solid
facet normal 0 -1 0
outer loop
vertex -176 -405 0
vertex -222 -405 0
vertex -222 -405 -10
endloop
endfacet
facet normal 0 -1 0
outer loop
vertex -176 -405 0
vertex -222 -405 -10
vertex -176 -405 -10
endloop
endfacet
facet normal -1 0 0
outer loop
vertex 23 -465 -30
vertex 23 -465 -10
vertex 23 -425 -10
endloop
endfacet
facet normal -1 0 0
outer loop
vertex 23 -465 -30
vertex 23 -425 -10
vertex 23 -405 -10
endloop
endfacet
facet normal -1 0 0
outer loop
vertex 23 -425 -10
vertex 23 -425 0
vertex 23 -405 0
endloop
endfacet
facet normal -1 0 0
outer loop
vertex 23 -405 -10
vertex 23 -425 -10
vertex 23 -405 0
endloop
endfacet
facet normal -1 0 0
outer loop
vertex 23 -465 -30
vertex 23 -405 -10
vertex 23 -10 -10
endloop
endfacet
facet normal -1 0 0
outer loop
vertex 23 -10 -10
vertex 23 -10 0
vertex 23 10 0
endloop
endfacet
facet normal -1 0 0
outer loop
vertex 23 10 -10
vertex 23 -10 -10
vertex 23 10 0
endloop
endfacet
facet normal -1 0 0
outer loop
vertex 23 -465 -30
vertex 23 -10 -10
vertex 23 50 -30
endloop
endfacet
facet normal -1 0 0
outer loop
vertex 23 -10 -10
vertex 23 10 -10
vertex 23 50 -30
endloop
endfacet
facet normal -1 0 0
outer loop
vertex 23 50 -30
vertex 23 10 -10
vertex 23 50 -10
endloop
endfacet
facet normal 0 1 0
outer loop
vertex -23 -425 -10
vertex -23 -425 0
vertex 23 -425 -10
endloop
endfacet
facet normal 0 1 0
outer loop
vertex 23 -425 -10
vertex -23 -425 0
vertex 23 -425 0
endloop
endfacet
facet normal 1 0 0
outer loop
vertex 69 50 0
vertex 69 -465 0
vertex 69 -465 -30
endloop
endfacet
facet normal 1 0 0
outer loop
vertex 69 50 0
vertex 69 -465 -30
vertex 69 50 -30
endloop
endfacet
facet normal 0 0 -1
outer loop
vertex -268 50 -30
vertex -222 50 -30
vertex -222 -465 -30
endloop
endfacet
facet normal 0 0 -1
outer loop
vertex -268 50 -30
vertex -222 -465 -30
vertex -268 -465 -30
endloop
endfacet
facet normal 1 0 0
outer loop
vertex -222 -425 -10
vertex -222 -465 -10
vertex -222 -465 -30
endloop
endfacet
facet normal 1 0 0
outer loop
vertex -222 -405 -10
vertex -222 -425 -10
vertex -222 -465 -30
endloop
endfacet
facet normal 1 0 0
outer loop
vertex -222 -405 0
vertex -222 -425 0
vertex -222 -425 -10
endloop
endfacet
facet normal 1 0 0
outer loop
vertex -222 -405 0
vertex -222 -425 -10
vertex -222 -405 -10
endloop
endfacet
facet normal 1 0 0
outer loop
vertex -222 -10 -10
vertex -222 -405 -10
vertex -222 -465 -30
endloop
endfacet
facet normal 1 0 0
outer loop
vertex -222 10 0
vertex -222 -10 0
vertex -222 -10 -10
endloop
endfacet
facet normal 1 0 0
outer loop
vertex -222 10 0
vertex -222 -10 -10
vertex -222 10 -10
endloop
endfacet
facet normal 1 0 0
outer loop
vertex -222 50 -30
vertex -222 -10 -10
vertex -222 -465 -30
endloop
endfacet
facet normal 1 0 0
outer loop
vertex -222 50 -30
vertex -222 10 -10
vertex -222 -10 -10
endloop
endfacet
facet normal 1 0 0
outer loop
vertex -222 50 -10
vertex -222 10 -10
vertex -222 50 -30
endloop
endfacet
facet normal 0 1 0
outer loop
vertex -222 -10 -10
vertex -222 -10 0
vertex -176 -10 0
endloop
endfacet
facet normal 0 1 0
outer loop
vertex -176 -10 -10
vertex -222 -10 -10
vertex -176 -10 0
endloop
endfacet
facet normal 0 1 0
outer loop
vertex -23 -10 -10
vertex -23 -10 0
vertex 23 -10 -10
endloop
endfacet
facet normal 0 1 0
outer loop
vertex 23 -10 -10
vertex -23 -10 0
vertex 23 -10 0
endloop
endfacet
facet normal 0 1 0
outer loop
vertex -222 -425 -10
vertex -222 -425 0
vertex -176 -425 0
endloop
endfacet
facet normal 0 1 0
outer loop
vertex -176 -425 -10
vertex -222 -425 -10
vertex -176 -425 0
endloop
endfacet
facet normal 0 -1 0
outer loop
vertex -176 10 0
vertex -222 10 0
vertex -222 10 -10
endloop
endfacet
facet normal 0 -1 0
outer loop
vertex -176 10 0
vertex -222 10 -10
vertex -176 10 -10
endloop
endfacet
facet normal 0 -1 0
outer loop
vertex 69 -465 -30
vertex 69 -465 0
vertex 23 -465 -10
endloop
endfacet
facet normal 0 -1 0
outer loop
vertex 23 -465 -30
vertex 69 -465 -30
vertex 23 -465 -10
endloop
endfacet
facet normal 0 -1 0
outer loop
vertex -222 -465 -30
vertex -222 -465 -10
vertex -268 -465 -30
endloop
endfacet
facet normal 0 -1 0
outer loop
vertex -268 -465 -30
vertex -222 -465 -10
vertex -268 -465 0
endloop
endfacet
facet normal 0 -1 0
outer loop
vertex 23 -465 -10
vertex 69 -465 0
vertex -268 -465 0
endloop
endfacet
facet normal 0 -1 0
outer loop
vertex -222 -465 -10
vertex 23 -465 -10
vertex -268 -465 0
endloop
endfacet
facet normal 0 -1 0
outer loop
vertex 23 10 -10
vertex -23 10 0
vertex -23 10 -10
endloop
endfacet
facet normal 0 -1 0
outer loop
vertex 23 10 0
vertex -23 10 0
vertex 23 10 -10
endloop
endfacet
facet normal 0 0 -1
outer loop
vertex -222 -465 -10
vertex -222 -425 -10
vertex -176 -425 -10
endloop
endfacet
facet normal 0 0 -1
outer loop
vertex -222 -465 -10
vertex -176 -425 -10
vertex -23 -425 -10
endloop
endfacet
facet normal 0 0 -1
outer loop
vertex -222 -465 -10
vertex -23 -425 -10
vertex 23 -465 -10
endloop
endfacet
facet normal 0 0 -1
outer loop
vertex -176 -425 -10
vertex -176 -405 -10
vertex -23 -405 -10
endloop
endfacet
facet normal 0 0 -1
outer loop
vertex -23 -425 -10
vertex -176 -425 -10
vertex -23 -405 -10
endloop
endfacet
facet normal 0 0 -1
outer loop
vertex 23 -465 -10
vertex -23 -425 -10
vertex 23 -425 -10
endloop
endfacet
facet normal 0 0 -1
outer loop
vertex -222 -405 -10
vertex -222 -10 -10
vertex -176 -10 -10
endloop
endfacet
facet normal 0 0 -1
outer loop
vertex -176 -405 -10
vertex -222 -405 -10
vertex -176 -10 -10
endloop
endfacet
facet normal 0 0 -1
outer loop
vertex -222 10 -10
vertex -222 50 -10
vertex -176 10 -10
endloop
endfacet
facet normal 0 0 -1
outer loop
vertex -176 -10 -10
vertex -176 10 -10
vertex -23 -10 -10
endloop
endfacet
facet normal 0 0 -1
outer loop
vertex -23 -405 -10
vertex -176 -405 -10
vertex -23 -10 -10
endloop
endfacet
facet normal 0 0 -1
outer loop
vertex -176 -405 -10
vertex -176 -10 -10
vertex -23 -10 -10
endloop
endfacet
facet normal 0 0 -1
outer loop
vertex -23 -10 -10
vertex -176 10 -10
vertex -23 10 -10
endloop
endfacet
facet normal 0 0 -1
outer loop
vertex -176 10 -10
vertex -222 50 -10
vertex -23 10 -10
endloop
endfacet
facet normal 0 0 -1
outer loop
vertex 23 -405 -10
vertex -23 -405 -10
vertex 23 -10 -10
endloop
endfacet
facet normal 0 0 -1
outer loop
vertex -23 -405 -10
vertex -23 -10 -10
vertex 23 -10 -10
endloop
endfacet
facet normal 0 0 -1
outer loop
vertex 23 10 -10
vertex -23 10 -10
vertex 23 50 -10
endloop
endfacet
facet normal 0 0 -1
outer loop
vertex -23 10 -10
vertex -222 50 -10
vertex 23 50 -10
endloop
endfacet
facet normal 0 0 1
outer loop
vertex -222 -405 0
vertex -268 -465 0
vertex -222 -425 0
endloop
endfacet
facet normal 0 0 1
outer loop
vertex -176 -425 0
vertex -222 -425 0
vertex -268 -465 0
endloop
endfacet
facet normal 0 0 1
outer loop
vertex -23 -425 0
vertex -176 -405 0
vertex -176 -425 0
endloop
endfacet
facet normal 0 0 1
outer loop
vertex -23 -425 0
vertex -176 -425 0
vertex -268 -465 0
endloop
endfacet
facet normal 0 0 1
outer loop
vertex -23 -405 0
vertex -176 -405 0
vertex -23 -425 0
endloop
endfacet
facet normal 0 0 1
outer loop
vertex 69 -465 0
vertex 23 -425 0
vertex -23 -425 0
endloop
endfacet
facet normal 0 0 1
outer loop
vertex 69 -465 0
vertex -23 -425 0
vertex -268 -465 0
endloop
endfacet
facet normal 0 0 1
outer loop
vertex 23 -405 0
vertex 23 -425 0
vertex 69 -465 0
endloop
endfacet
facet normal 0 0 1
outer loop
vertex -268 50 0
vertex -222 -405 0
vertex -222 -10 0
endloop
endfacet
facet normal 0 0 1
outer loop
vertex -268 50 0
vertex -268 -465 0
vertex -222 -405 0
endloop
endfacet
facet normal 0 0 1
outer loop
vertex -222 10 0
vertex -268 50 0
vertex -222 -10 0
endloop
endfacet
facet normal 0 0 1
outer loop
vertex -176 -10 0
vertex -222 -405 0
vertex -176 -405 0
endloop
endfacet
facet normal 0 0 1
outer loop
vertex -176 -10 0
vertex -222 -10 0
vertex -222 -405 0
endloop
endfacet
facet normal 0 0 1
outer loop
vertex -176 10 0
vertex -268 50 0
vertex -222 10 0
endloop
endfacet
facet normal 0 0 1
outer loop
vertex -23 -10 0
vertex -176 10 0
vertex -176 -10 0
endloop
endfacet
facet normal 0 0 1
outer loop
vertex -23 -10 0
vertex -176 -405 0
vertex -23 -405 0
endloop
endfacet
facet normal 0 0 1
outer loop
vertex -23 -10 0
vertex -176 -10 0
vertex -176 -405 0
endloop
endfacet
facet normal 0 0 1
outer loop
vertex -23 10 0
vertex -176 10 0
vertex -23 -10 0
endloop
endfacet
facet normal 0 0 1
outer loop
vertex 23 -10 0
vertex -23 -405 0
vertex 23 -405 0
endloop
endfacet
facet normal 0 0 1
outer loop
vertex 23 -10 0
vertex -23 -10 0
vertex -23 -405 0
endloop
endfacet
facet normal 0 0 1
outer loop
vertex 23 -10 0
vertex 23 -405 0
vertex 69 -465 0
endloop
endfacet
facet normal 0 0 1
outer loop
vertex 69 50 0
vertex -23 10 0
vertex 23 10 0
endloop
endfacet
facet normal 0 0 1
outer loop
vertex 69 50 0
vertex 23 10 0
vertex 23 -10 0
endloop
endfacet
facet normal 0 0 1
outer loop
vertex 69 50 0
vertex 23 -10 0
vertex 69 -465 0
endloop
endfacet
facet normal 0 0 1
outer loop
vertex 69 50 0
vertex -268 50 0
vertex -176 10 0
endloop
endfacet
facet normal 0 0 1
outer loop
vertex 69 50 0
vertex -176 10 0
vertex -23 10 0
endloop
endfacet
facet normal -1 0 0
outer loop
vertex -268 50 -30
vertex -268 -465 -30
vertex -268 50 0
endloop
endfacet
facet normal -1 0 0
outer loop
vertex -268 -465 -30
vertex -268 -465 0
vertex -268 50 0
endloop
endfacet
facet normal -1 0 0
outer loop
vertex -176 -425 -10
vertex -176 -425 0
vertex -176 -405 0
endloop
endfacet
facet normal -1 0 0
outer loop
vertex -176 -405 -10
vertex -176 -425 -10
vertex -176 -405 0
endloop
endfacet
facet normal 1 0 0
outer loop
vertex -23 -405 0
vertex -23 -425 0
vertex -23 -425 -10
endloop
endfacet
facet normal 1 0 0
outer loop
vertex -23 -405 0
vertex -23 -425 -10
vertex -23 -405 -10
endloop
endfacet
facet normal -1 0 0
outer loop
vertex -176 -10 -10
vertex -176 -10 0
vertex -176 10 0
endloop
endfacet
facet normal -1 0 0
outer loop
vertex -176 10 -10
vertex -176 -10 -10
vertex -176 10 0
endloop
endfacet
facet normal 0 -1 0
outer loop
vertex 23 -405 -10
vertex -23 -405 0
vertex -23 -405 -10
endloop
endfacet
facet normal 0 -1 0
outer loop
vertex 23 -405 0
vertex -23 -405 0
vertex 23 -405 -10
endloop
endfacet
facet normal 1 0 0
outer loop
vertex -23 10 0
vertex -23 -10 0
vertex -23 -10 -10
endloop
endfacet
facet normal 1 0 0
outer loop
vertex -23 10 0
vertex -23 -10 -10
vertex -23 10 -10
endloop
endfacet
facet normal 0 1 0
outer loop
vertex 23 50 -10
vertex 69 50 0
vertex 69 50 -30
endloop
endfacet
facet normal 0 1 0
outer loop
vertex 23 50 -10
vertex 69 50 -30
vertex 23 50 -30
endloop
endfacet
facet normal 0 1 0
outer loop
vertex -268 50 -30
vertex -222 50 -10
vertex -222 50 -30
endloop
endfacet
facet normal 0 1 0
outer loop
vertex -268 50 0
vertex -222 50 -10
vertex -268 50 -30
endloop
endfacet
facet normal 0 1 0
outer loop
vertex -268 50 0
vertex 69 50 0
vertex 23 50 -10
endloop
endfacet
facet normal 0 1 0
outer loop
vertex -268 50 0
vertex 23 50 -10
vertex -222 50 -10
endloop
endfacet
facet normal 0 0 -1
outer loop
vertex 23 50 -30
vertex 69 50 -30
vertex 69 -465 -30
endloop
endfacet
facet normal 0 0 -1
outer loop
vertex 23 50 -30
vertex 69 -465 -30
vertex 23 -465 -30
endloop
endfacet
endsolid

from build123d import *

# Parameters (mm, degrees)
SKETCH1_W           = 337
SKETCH1_H           = 515
SKETCH1_W_2         = 46
SKETCH1_H_2         = 20
BOSS_EXTRUDE1_DEPTH = 10
SKETCH2_W           = 46
SKETCH2_H           = 515
BOSS_EXTRUDE2_DEPTH = 20


with BuildPart() as part:
    # Sketch1 → Boss-Extrude1 (new body)
    with BuildSketch(Plane.XY):
        with Locations((-99.5, -207.5)):
            Rectangle(SKETCH1_W, SKETCH1_H)
        with Locations((-199, -415)):
            Rectangle(SKETCH1_W_2, SKETCH1_H_2, mode=Mode.SUBTRACT)
        with Locations((0, -415)):
            Rectangle(SKETCH1_W_2, SKETCH1_H_2, mode=Mode.SUBTRACT)
        with Locations((-199, 0)):
            Rectangle(SKETCH1_W_2, SKETCH1_H_2, mode=Mode.SUBTRACT)
        Rectangle(SKETCH1_W_2, SKETCH1_H_2, mode=Mode.SUBTRACT)
    extrude(amount=-BOSS_EXTRUDE1_DEPTH)

    # Sketch2 → Boss-Extrude2 (add)
    with BuildSketch(Plane(origin=(0, 0, -10), x_dir=(-1, 0, 0), z_dir=(0, 0, -1))):
        with Locations((245, -207.5)):
            Rectangle(SKETCH2_W, SKETCH2_H)
        with Locations((-46, -207.5)):
            Rectangle(SKETCH2_W, SKETCH2_H)
    extrude(amount=BOSS_EXTRUDE2_DEPTH)


solid = part.part
